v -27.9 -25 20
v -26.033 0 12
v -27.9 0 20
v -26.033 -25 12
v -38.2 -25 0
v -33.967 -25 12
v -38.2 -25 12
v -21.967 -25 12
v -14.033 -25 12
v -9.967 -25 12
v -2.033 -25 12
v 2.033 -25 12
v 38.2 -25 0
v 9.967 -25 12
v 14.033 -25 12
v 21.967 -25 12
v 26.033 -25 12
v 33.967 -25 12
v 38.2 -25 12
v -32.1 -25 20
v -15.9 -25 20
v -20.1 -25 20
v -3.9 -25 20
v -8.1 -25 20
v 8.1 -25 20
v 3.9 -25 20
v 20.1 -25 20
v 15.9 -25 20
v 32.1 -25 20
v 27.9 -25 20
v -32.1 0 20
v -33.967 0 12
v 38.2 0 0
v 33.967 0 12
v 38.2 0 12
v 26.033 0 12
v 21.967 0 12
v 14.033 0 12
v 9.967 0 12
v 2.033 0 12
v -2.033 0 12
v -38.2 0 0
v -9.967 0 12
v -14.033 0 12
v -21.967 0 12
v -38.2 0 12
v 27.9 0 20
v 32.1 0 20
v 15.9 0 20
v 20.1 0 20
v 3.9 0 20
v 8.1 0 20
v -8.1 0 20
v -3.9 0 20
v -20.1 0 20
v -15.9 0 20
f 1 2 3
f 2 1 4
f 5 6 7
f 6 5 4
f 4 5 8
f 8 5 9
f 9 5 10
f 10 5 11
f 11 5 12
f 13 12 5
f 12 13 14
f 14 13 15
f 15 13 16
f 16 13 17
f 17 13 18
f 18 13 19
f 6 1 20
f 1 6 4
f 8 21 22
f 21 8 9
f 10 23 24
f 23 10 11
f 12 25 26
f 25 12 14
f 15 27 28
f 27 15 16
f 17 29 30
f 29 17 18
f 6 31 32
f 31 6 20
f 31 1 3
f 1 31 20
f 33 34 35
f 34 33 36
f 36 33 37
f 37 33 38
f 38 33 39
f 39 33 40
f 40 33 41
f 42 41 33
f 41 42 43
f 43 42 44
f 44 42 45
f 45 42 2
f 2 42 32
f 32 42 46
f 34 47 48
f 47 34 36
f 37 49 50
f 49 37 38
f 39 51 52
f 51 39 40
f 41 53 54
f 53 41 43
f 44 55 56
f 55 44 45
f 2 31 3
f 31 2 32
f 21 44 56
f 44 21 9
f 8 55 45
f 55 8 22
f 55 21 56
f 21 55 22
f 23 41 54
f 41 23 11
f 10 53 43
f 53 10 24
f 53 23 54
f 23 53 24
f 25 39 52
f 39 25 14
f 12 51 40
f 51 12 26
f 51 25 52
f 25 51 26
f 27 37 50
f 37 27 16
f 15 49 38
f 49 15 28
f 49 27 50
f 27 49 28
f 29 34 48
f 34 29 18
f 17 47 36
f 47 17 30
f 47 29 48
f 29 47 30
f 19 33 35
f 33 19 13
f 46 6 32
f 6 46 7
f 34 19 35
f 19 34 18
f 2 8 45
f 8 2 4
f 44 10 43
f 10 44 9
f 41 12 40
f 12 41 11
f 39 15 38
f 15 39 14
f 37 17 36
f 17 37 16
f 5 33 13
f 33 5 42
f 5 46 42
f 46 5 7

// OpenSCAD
$fn = 32;

// ----------------------------------------------------------------------
// Toothed rack, 6 teeth
// 12 mm pitch, 8 mm teeth
// ----------------------------------------------------------------------

// --- parameters (mm) ---
bar_w = 25;     // bar width (Y)
bar_h = 12;     // bar height (Z)
teeth = 6;      // number of teeth
pitch = 12;     // tooth pitch
tooth_h = 8;    // tooth height above the bar
root_w = 8.4;   // tooth width at the root
crest_w = 4.2;  // tooth width at the crest

// --- derived feature positions (mm) ---
span = (teeth - 1) * pitch;  // = 60   distance between the outer teeth
bar_l = span + root_w + 8;   // = 76.4   bar length: teeth plus 4 mm at each end
tooth_x = -span / 2;         // = -30   X of the first tooth
height = bar_h + tooth_h;    // = 20   overall height
feature_centers = [
  [tooth_x + 0 * pitch, -bar_w / 2],
  [tooth_x + 1 * pitch, -bar_w / 2],
  [tooth_x + 2 * pitch, -bar_w / 2],
  [tooth_x + 3 * pitch, -bar_w / 2],
  [tooth_x + 4 * pitch, -bar_w / 2],
  [tooth_x + 5 * pitch, -bar_w / 2]
];   // tooth centre line, drives the tooth loop

// bar with a rack of teeth, one extruded trapezoium per centre
module rack_tooth() {
  linear_extrude(height = bar_w)
    polygon(points = [
      [0, 0],
      [root_w, 0],
      [root_w / 2 + crest_w / 2, tooth_h + 1],
      [root_w / 2 - crest_w / 2, tooth_h + 1]
    ]);
}

union() {
  translate([-bar_l / 2, -bar_w, 0]) cube([bar_l, bar_w, bar_h]);
  for (centre = feature_centers)
    translate([centre[0] - root_w / 2, 0, bar_h - 1]) rotate([90, 0, 0]) rack_tooth();
}
